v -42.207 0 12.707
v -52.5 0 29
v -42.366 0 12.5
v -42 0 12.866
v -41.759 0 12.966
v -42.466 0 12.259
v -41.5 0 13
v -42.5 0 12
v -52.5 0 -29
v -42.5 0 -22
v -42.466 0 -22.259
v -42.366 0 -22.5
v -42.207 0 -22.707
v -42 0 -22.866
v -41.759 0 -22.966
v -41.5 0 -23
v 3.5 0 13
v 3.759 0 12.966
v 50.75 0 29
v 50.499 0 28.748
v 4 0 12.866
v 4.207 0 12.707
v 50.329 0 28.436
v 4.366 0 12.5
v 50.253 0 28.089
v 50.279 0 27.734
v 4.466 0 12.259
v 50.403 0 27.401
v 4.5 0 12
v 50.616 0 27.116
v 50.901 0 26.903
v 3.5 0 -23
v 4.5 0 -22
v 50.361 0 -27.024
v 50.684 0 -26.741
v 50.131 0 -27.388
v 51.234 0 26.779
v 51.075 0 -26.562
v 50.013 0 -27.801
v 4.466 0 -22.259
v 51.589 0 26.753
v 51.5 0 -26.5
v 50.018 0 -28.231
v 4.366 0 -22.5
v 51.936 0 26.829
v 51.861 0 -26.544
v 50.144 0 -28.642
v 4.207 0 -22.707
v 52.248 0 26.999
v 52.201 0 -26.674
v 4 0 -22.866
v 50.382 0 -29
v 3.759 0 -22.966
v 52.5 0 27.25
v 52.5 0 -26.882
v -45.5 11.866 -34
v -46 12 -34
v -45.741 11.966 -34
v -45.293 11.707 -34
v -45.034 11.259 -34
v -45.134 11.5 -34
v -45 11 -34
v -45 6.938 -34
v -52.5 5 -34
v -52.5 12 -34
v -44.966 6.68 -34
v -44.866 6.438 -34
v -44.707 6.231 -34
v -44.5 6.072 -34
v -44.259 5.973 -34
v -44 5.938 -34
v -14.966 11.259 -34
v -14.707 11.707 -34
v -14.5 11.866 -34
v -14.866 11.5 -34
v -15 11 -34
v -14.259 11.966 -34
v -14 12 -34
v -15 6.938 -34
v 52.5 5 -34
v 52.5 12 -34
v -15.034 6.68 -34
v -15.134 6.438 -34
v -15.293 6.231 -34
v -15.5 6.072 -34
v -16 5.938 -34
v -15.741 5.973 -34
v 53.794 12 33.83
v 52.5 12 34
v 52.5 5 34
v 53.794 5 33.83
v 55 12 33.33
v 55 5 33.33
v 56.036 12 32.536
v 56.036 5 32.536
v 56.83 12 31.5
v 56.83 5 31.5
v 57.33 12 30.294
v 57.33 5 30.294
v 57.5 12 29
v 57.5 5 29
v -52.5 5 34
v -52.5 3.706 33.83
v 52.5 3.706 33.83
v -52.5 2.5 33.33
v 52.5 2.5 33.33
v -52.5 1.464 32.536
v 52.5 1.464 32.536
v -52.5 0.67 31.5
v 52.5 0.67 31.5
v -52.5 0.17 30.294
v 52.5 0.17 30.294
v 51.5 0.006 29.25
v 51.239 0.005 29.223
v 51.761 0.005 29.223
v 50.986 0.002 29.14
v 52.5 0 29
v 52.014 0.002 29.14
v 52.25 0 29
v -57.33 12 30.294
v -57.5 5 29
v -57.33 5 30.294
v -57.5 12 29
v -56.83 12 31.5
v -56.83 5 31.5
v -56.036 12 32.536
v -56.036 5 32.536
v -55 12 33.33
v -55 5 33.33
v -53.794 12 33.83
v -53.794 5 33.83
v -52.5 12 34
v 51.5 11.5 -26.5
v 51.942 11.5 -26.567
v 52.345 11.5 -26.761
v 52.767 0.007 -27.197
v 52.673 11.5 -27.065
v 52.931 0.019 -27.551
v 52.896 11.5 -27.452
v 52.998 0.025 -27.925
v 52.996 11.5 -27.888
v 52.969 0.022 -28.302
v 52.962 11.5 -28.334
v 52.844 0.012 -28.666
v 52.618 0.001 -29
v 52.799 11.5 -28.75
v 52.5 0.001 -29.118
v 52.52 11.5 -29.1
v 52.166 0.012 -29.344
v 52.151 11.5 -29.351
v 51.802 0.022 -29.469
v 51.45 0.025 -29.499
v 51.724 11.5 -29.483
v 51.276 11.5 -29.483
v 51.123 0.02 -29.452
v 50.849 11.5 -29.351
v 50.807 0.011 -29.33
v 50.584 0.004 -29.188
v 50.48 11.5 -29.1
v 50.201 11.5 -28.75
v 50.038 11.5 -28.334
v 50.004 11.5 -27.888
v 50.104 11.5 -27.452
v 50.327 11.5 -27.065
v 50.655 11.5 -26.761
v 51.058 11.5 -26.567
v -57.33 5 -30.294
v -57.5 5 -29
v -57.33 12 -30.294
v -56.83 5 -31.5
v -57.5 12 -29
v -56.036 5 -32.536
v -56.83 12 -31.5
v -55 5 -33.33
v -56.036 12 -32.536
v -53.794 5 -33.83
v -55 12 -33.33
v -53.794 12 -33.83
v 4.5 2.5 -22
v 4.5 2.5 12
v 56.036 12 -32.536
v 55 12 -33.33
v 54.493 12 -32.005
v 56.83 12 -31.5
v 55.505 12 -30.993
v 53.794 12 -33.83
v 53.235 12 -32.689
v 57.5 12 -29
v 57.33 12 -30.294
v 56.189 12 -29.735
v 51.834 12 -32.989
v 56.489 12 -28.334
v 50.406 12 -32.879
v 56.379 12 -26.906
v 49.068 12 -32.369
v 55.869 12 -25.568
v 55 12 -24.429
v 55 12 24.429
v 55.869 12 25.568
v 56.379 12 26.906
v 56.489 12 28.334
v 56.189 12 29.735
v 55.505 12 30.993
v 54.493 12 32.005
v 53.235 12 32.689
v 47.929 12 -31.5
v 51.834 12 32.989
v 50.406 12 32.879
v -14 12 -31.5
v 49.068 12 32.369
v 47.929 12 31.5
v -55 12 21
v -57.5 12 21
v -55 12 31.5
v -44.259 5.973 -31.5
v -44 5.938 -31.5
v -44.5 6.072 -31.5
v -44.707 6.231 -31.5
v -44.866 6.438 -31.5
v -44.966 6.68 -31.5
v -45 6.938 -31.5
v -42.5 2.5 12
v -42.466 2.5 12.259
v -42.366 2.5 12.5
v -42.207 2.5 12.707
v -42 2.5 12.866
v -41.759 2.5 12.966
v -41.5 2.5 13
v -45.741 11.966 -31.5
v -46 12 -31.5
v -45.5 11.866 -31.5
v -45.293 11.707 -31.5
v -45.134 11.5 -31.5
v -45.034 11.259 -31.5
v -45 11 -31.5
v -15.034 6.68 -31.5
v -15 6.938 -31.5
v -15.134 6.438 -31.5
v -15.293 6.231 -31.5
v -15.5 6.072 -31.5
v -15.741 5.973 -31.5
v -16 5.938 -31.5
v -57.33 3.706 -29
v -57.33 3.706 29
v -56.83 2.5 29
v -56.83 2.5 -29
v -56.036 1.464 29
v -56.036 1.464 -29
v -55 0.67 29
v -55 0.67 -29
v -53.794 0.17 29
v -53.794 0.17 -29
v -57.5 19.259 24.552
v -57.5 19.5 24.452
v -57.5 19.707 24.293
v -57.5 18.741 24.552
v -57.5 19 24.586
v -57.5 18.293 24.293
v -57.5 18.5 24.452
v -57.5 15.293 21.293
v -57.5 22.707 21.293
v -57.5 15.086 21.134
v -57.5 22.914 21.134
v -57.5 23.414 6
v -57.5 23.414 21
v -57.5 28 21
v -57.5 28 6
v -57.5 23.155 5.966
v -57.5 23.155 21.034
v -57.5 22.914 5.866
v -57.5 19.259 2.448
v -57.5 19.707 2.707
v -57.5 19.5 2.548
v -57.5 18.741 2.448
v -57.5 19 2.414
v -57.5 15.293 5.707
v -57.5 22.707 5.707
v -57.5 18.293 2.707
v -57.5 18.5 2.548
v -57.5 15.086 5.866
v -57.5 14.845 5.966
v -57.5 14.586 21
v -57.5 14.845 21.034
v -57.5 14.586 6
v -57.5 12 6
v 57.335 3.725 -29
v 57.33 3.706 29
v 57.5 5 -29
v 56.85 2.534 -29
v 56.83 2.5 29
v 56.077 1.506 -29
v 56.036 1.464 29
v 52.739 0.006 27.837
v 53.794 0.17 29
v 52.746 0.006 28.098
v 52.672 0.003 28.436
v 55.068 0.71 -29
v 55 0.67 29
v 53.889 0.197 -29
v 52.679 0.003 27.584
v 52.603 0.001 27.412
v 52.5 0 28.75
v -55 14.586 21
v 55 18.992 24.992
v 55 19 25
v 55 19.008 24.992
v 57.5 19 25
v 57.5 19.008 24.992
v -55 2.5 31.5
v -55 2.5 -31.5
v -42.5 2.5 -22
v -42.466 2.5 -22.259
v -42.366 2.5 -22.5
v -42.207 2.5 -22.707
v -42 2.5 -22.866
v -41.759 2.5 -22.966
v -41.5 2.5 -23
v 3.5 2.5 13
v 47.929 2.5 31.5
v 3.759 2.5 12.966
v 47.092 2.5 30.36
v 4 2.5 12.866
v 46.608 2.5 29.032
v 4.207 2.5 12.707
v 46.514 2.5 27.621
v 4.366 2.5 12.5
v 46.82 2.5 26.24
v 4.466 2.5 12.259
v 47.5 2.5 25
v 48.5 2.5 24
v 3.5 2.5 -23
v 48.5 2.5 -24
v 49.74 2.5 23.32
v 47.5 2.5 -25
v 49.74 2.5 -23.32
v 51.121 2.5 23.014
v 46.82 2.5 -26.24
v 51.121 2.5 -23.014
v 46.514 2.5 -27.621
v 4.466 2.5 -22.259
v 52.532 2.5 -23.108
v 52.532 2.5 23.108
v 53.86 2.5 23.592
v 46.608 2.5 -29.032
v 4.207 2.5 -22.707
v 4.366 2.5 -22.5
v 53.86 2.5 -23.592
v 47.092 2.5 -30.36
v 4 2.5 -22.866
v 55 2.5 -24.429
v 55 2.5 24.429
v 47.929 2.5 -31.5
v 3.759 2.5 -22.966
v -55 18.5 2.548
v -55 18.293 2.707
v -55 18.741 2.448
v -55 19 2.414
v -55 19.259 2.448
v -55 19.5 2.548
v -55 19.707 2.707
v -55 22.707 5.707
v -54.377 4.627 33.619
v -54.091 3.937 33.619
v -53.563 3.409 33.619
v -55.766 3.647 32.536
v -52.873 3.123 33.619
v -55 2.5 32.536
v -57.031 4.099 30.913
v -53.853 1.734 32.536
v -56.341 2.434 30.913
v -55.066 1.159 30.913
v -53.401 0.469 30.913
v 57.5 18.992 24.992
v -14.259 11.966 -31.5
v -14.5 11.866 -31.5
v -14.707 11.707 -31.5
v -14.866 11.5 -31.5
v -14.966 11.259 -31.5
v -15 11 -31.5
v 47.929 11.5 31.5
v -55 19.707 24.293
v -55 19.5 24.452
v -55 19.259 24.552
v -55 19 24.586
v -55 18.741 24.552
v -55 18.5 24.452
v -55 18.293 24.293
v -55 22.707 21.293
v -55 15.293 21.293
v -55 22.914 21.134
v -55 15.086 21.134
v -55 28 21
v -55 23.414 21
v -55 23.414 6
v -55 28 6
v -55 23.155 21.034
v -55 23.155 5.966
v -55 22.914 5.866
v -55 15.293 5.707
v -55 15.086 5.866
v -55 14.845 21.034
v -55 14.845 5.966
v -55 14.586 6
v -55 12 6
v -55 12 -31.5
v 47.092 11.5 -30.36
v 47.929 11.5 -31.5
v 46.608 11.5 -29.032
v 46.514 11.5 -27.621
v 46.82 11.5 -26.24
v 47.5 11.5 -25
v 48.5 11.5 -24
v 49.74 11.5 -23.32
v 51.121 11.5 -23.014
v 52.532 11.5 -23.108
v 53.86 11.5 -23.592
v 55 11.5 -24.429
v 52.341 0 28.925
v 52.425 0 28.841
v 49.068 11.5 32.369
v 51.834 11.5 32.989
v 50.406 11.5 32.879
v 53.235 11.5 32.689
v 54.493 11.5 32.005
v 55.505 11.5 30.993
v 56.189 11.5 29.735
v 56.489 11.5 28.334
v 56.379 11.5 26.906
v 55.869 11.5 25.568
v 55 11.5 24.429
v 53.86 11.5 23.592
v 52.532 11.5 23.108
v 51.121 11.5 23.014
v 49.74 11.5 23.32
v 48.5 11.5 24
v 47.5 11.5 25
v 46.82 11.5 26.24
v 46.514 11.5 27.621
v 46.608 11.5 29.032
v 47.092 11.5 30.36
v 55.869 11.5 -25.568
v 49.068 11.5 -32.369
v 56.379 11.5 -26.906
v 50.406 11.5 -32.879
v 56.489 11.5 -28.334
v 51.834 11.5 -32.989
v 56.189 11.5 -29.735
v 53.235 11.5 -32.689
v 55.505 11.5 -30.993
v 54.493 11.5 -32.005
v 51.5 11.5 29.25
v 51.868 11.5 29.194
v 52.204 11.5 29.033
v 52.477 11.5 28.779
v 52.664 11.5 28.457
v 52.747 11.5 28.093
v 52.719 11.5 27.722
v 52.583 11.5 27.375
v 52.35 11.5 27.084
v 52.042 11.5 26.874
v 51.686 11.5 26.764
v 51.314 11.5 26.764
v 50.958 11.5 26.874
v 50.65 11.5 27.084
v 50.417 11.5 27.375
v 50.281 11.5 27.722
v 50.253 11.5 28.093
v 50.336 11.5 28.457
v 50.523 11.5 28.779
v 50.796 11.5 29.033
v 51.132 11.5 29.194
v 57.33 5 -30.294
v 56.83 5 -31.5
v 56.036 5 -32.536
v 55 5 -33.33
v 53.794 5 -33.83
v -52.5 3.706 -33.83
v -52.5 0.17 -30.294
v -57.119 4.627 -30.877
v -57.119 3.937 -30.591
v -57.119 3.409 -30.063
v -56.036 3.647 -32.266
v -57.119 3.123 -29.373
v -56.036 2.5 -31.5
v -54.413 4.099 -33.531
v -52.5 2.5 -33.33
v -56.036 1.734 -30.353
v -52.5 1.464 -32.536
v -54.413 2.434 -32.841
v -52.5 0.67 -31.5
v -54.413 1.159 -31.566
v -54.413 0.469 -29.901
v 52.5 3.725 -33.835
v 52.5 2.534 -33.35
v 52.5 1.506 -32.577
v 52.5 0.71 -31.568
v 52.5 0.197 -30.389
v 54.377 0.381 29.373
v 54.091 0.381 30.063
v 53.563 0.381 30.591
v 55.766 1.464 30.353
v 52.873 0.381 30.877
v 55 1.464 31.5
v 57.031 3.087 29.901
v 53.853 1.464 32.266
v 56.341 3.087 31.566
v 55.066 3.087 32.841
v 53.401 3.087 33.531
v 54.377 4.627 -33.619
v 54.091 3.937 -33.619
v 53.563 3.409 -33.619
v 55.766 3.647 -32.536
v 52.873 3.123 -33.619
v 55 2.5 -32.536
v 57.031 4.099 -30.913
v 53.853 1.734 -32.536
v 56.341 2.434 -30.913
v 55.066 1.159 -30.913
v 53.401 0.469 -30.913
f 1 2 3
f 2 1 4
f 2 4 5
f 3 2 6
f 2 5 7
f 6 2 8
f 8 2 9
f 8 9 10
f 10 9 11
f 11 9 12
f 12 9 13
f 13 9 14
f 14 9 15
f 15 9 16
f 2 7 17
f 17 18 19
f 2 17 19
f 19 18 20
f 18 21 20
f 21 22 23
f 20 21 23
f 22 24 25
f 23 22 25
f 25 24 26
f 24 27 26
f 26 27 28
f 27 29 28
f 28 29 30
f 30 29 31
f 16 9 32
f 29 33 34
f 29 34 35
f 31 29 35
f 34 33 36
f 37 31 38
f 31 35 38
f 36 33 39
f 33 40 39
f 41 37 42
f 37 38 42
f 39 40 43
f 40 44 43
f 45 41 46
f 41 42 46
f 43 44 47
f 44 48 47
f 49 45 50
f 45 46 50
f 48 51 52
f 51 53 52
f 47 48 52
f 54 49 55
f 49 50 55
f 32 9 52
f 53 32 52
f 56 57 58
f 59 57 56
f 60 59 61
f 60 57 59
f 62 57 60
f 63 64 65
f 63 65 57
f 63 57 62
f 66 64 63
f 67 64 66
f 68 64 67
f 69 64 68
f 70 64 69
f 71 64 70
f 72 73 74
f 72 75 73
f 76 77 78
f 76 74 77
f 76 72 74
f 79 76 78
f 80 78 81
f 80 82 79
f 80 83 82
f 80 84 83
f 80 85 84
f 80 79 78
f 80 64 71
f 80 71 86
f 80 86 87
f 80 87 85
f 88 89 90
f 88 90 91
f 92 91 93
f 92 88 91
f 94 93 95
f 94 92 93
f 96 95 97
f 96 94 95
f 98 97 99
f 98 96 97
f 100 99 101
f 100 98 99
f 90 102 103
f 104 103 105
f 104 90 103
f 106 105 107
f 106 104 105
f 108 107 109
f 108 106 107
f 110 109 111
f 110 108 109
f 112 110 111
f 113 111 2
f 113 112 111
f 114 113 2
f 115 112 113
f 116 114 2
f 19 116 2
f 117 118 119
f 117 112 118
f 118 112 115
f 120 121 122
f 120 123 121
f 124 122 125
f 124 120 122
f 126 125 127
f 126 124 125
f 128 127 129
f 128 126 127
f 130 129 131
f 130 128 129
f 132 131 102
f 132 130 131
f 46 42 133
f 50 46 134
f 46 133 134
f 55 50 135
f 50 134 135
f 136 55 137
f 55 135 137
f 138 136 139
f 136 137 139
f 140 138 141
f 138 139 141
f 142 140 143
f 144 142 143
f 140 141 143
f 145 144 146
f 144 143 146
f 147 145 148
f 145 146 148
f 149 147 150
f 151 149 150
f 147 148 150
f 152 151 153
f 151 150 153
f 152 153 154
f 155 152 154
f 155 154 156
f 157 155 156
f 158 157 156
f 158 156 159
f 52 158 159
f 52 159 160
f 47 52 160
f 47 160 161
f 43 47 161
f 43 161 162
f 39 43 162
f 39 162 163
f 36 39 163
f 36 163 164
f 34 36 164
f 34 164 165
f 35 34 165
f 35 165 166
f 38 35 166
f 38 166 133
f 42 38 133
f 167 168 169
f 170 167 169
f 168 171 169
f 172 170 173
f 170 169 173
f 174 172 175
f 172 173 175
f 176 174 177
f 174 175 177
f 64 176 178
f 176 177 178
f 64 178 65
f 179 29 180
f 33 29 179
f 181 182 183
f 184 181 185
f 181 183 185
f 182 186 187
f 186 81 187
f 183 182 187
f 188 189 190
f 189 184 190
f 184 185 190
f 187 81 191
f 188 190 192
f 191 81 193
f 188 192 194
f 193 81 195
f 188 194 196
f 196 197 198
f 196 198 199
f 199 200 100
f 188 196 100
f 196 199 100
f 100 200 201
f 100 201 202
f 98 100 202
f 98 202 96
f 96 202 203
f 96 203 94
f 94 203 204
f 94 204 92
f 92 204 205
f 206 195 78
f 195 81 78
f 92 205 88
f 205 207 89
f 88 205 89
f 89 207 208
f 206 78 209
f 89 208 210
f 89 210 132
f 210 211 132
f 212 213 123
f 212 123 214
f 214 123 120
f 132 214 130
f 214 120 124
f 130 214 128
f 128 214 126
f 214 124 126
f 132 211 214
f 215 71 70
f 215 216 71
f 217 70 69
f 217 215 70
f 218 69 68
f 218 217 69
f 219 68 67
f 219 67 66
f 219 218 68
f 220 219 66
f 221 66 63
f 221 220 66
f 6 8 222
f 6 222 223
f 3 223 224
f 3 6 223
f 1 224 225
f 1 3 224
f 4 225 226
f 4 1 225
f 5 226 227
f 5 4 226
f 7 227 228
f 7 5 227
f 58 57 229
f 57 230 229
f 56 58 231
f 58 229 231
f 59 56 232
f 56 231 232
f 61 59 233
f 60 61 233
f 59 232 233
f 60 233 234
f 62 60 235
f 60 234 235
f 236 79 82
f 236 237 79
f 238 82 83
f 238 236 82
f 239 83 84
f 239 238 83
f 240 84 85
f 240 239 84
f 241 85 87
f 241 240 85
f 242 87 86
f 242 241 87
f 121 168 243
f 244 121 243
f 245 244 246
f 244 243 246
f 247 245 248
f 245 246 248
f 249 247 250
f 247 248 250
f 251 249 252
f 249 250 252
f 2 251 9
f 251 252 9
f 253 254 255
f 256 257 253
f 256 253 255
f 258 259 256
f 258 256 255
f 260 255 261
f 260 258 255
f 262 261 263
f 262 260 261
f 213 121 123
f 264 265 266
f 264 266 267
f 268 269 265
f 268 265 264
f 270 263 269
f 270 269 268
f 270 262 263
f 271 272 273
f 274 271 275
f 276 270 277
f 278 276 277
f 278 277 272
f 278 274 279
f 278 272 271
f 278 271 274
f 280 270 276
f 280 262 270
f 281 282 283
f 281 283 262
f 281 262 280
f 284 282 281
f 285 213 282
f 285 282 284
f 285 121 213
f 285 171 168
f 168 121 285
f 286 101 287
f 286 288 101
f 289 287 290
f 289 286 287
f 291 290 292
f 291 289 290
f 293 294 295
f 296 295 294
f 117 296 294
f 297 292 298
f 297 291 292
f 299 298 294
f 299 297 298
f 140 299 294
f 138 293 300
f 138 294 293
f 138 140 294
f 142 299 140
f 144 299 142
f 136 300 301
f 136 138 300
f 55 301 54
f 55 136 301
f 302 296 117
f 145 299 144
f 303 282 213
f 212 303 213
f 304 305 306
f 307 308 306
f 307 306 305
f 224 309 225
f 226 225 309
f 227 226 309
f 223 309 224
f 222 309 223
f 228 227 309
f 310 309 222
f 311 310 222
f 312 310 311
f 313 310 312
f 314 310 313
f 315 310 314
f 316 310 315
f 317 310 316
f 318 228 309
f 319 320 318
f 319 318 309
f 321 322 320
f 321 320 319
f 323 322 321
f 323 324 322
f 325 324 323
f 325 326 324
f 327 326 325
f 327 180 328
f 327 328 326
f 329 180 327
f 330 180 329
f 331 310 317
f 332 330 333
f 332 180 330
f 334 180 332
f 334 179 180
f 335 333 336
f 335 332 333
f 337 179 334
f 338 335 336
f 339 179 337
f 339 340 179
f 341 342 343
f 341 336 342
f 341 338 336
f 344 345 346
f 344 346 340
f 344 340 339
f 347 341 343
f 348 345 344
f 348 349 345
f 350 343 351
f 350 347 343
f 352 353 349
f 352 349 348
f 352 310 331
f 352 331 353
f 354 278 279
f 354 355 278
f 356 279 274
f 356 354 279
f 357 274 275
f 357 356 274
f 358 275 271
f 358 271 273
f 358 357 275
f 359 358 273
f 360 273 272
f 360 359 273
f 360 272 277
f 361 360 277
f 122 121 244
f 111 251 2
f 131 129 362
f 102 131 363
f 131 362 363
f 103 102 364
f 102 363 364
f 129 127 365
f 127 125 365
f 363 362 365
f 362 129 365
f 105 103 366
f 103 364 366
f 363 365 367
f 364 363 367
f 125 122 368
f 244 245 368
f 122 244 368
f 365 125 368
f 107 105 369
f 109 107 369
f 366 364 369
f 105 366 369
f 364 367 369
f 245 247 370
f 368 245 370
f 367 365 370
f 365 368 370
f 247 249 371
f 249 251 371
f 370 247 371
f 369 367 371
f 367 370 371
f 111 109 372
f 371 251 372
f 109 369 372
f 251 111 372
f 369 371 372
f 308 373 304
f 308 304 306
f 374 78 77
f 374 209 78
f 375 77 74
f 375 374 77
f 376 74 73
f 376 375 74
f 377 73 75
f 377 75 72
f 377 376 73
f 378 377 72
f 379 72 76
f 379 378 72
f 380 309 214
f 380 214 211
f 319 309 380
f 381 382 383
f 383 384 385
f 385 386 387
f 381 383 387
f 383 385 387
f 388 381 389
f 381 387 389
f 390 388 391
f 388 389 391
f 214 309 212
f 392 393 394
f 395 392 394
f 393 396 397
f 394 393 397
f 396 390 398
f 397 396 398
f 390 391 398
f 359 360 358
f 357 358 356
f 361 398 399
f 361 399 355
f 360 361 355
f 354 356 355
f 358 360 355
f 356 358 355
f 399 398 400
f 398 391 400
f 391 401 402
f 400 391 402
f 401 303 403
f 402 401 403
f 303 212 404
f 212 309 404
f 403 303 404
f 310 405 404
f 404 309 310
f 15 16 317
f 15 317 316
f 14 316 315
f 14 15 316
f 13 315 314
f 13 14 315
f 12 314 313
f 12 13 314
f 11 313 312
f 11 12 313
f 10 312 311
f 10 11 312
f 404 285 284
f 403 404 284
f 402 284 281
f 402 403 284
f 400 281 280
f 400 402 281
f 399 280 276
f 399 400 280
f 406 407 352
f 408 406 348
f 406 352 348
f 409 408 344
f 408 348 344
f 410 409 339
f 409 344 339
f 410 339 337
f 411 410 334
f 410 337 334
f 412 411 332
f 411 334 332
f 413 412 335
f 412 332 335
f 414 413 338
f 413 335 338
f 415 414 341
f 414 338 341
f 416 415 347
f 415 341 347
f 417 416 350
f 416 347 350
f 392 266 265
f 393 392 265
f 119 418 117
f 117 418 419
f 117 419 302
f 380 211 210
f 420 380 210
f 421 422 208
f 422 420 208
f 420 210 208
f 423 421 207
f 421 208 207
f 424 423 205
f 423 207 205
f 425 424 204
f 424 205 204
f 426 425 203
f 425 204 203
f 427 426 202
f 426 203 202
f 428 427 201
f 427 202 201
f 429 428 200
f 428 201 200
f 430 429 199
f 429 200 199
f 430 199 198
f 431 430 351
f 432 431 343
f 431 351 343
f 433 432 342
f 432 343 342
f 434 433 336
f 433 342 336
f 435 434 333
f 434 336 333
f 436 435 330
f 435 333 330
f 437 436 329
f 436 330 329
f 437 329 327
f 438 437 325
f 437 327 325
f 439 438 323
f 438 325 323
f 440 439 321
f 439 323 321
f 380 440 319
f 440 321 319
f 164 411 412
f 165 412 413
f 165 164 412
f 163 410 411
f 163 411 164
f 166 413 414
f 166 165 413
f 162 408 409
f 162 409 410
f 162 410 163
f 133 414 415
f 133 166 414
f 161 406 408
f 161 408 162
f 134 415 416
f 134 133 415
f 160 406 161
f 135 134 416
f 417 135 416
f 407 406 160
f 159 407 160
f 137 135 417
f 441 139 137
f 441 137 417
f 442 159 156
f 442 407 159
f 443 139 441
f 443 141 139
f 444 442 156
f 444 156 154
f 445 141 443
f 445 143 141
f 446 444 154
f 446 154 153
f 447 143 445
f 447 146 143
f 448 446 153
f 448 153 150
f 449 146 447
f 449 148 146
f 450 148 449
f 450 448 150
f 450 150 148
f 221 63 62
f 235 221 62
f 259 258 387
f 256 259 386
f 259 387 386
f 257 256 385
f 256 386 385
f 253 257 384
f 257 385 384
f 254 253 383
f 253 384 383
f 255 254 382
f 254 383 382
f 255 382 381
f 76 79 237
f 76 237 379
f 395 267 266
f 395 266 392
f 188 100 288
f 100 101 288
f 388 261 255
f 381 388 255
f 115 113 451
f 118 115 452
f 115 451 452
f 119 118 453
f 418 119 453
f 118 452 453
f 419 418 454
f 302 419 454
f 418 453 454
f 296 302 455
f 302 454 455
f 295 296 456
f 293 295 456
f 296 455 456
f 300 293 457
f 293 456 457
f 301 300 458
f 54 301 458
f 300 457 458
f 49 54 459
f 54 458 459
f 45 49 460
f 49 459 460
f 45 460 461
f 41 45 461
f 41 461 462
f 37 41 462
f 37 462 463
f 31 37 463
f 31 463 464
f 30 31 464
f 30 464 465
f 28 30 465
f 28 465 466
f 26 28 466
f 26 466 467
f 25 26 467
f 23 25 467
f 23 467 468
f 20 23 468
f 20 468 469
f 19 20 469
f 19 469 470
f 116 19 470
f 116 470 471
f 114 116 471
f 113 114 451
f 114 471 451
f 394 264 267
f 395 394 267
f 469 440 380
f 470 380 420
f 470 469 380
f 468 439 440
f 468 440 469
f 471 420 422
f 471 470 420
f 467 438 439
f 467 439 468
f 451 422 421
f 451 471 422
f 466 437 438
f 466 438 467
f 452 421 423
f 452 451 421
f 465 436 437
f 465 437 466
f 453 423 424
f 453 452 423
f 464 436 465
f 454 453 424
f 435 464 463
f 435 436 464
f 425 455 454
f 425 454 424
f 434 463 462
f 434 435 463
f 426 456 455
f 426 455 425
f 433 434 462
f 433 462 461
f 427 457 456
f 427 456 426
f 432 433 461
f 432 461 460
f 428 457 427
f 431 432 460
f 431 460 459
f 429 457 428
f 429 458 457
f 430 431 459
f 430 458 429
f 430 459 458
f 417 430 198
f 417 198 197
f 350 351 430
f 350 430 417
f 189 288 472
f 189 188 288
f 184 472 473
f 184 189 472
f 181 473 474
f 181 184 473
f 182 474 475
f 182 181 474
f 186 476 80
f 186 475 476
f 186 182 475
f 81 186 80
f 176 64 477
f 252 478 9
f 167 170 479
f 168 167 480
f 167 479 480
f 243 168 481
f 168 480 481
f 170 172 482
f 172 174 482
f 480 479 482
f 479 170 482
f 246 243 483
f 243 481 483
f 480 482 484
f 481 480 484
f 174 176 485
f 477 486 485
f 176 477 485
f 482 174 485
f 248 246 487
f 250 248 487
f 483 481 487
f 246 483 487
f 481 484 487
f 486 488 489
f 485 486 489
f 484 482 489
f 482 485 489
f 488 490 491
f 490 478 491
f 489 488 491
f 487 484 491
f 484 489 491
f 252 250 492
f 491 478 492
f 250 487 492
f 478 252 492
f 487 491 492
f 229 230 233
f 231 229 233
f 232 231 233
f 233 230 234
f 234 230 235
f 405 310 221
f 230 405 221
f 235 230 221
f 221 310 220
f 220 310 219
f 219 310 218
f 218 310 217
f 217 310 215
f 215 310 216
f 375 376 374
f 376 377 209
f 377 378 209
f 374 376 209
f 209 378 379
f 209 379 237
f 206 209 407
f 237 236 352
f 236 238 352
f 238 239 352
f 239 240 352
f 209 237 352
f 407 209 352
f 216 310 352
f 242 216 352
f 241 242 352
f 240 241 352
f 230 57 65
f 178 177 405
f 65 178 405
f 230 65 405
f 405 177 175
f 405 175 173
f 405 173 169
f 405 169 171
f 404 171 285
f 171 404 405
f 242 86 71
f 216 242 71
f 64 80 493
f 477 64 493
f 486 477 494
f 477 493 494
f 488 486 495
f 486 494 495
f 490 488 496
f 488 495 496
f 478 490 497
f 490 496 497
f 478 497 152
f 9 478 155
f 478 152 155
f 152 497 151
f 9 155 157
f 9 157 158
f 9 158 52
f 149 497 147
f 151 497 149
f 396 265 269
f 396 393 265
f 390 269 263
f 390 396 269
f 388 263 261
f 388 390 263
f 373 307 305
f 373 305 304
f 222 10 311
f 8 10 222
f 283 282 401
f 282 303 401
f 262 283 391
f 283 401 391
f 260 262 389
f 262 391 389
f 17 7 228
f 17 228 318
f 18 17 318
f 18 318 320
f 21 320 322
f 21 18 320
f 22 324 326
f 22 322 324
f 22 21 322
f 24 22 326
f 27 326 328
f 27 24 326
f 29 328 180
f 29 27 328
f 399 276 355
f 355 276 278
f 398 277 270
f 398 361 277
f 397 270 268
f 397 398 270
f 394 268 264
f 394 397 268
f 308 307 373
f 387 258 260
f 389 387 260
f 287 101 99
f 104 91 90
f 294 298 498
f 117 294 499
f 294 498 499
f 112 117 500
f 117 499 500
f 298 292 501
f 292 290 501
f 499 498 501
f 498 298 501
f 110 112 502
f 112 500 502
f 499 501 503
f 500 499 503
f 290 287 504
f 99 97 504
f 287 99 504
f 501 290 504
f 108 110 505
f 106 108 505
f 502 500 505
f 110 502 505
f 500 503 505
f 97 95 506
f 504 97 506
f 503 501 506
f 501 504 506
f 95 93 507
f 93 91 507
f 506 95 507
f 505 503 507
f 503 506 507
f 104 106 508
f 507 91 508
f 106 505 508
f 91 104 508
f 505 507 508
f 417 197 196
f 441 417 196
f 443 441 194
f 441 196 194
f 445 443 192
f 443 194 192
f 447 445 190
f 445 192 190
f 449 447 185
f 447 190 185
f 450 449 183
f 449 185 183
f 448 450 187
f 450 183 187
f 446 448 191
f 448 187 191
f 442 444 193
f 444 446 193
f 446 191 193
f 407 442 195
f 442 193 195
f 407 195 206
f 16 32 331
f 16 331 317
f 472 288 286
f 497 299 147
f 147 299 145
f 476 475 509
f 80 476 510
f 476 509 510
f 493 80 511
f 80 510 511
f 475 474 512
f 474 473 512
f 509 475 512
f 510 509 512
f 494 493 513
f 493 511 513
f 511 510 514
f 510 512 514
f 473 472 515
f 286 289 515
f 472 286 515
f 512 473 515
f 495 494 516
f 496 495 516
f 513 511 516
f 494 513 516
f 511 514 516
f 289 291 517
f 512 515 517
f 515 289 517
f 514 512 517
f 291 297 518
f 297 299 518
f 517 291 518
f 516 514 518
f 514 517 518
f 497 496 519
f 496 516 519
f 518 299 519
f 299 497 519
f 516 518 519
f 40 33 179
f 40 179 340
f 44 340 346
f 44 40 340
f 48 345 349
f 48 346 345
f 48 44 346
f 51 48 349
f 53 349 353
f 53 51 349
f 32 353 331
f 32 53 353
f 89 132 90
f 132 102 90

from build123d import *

# Parameters (mm, degrees)
SKETCH1_W           = 115
SKETCH1_H           = 68
BOSS_EXTRUDE1_DEPTH = 28
SHELL2_T            = -2.5
CUT_EXTRUDE8_DEPTH  = 124.146254511
CUT_EXTRUDE9_REACH  = 125.146
SKETCH10_W          = 26.217499217
SKETCH10_H          = 23
FILLET3_R           = 5
FILLET4_R           = 1
SKETCH11_R          = 5
BOSS_EXTRUDE3_DEPTH = 9.5
SKETCH12_R          = 5
CUT_EXTRUDE10_DEPTH = 0.5
SKETCH13_R          = 1.25
CUT_EXTRUDE11_DEPTH = 69.807703057
SKETCH15_R          = 1.5
CUT_EXTRUDE12_DEPTH = 69.80770319
CUT_EXTRUDE13_DEPTH = 73.431001776
SKETCH18_W          = 30
SKETCH18_H          = 6.061530508
CUT_EXTRUDE14_DEPTH = 2.5
FILLET5_R           = 1


with BuildPart() as part:
    # Sketch1 → Boss-Extrude1 (new body)
    with BuildSketch(Plane(origin=(0, 0, 0), x_dir=(1, 0, 0), z_dir=(0, 1, 0))):
        Rectangle(SKETCH1_W, SKETCH1_H)
    extrude(amount=BOSS_EXTRUDE1_DEPTH)

    # Shell2
    shell2_openings = [part.faces().sort_by_distance(p)[0] for p in [
        (0, 28, 0),
    ]]
    offset(amount=SHELL2_T, openings=shell2_openings, kind=Kind.INTERSECTION)

    # Sketch9 → Cut-Extrude8 (cut, through all)
    with BuildSketch(Plane.ZY.offset(57.5)):
        Polygon((-34, 12), (6, 12), (6, 15), (2, 19), (6, 23), (6, 28), (21, 28), (21, 23), (25, 19), (21, 15), (21, 12), (34, 12), (34, 34), (-34, 34), align=None)
    extrude(amount=-CUT_EXTRUDE8_DEPTH, mode=Mode.SUBTRACT)

    # Sketch10 → Cut-Extrude9 (cut, up to next)
    with BuildSketch(Plane(origin=(57.5, 0, 0), x_dir=(0, 0, -1), z_dir=(1, 0, 0)), mode=Mode.PRIVATE) as cut_extrude9_sk1:
        with Locations((-11.882996399, 23.5)):
            Rectangle(SKETCH10_W, SKETCH10_H)
    cut_extrude9_tool1 = extrude(cut_extrude9_sk1.sketch, amount=-CUT_EXTRUDE9_REACH, mode=Mode.PRIVATE) & part.part
    add(cut_extrude9_tool1.solids().sort_by_distance((57.5, 23.5, 11.882996))[0], mode=Mode.SUBTRACT)


with BuildPart() as cut_extrude9_piece_1:
    # of the separate pieces the step leaves, piece 1, a body of its own (cut_extrude9_pieces)
    add(part.part.solids().sort_by_distance((-57.5, 0, 34))[0])

    # Fillet3
    fillet3_edges = [cut_extrude9_piece_1.edges().sort_by_distance(p)[0] for p in [
        (57.5, 6, 34),
        (57.5, 0, 0),
        (57.5, 6, -34),
        (0, 0, -34),
        (-57.5, 6, -34),
        (-57.5, 0, 0),
        (-57.5, 6, 34),
        (0, 0, 34),
    ]]
    fillet(fillet3_edges, radius=FILLET3_R)

    # Fillet4
    fillet4_edges = [cut_extrude9_piece_1.edges().sort_by_distance(p)[0] for p in [
        (-56.25, 23, 21),
        (-56.25, 19, 25),
        (-56.25, 15, 21),
        (-56.25, 23, 6),
        (-56.25, 19, 2),
        (-56.25, 15, 6),
    ]]
    fillet(fillet4_edges, radius=FILLET4_R)

    # Sketch11 → Boss-Extrude3 (add)
    with BuildSketch(Plane(origin=(0, 2.5, 0), x_dir=(1, 0, 0), z_dir=(0, 1, 0))):
        with Locations((51.5, 28)):
            Circle(SKETCH11_R)
        with Locations((51.5, -28)):
            Circle(SKETCH11_R)
    extrude(amount=BOSS_EXTRUDE3_DEPTH)

    # Sketch12 → Cut-Extrude10 (cut)
    with BuildSketch(Plane(origin=(0, 12, 0), x_dir=(1, 0, 0), z_dir=(0, 1, 0))):
        with Locations((51.5, 28)):
            Circle(SKETCH12_R)
        with Locations((51.5, -28)):
            Circle(SKETCH12_R)
    extrude(amount=-CUT_EXTRUDE10_DEPTH, mode=Mode.SUBTRACT)

    # Sketch13 → Cut-Extrude11 (cut, through all)
    with BuildSketch(Plane(origin=(0, 11.5, 0), x_dir=(1, 0, 0), z_dir=(0, 1, 0))):
        with Locations(Location((51.5, -28, 0), (0, 0, 270))):
            Circle(SKETCH13_R)
    extrude(amount=-CUT_EXTRUDE11_DEPTH, mode=Mode.SUBTRACT)

    # Sketch15 → Cut-Extrude12 (cut, through all)
    with BuildSketch(Plane(origin=(0, 11.5, 0), x_dir=(1, 0, 0), z_dir=(0, 1, 0))):
        with Locations(Location((51.5, 28, 0), (0, 0, 270))):
            Circle(SKETCH15_R)
    extrude(amount=-CUT_EXTRUDE12_DEPTH, mode=Mode.SUBTRACT)

    # Sketch17 → Cut-Extrude13 (cut, through all)
    with BuildSketch(Plane.XZ):
        with BuildLine():
            Line((-41.5, 13), (3.5, 13))
            ThreePointArc((3.5, 13), (4.207106781, 12.707106781), (4.5, 12))
            Line((4.5, 12), (4.5, -22))
            ThreePointArc((4.5, -22), (4.207106781, -22.707106781), (3.5, -23))
            Line((3.5, -23), (-41.5, -23))
            ThreePointArc((-41.5, -23), (-42.207106781, -22.707106781), (-42.5, -22))
            Line((-42.5, -22), (-42.5, 12))
            ThreePointArc((-42.5, 12), (-42.207106781, 12.707106781), (-41.5, 13))
        make_face()
    extrude(amount=-CUT_EXTRUDE13_DEPTH, mode=Mode.SUBTRACT)

    # Sketch18 → Cut-Extrude14 (cut)
    with BuildSketch(Plane(origin=(0, 0, -34), x_dir=(-1, 0, 0), z_dir=(0, 0, -1))):
        with Locations((30, 8.969234746)):
            Rectangle(SKETCH18_W, SKETCH18_H)
    extrude(amount=-CUT_EXTRUDE14_DEPTH, mode=Mode.SUBTRACT)

    # Fillet5
    fillet5_edges = [cut_extrude9_piece_1.edges().sort_by_distance(p)[0] for p in [
        (-15, 5.938469492, -32.75),
        (-15, 12, -32.75),
        (-45, 12, -32.75),
        (-45, 5.938469492, -32.75),
    ]]
    fillet(fillet5_edges, radius=FILLET5_R)


with BuildPart() as cut_extrude9_piece_2:
    # of the separate pieces the step leaves, piece 2, a body of its own (cut_extrude9_pieces)
    add(part.part.solids().sort_by_distance((57.5, 19.008253993, 24.991746007))[0])


solid = Compound([cut_extrude9_piece_1.part, cut_extrude9_piece_2.part])
